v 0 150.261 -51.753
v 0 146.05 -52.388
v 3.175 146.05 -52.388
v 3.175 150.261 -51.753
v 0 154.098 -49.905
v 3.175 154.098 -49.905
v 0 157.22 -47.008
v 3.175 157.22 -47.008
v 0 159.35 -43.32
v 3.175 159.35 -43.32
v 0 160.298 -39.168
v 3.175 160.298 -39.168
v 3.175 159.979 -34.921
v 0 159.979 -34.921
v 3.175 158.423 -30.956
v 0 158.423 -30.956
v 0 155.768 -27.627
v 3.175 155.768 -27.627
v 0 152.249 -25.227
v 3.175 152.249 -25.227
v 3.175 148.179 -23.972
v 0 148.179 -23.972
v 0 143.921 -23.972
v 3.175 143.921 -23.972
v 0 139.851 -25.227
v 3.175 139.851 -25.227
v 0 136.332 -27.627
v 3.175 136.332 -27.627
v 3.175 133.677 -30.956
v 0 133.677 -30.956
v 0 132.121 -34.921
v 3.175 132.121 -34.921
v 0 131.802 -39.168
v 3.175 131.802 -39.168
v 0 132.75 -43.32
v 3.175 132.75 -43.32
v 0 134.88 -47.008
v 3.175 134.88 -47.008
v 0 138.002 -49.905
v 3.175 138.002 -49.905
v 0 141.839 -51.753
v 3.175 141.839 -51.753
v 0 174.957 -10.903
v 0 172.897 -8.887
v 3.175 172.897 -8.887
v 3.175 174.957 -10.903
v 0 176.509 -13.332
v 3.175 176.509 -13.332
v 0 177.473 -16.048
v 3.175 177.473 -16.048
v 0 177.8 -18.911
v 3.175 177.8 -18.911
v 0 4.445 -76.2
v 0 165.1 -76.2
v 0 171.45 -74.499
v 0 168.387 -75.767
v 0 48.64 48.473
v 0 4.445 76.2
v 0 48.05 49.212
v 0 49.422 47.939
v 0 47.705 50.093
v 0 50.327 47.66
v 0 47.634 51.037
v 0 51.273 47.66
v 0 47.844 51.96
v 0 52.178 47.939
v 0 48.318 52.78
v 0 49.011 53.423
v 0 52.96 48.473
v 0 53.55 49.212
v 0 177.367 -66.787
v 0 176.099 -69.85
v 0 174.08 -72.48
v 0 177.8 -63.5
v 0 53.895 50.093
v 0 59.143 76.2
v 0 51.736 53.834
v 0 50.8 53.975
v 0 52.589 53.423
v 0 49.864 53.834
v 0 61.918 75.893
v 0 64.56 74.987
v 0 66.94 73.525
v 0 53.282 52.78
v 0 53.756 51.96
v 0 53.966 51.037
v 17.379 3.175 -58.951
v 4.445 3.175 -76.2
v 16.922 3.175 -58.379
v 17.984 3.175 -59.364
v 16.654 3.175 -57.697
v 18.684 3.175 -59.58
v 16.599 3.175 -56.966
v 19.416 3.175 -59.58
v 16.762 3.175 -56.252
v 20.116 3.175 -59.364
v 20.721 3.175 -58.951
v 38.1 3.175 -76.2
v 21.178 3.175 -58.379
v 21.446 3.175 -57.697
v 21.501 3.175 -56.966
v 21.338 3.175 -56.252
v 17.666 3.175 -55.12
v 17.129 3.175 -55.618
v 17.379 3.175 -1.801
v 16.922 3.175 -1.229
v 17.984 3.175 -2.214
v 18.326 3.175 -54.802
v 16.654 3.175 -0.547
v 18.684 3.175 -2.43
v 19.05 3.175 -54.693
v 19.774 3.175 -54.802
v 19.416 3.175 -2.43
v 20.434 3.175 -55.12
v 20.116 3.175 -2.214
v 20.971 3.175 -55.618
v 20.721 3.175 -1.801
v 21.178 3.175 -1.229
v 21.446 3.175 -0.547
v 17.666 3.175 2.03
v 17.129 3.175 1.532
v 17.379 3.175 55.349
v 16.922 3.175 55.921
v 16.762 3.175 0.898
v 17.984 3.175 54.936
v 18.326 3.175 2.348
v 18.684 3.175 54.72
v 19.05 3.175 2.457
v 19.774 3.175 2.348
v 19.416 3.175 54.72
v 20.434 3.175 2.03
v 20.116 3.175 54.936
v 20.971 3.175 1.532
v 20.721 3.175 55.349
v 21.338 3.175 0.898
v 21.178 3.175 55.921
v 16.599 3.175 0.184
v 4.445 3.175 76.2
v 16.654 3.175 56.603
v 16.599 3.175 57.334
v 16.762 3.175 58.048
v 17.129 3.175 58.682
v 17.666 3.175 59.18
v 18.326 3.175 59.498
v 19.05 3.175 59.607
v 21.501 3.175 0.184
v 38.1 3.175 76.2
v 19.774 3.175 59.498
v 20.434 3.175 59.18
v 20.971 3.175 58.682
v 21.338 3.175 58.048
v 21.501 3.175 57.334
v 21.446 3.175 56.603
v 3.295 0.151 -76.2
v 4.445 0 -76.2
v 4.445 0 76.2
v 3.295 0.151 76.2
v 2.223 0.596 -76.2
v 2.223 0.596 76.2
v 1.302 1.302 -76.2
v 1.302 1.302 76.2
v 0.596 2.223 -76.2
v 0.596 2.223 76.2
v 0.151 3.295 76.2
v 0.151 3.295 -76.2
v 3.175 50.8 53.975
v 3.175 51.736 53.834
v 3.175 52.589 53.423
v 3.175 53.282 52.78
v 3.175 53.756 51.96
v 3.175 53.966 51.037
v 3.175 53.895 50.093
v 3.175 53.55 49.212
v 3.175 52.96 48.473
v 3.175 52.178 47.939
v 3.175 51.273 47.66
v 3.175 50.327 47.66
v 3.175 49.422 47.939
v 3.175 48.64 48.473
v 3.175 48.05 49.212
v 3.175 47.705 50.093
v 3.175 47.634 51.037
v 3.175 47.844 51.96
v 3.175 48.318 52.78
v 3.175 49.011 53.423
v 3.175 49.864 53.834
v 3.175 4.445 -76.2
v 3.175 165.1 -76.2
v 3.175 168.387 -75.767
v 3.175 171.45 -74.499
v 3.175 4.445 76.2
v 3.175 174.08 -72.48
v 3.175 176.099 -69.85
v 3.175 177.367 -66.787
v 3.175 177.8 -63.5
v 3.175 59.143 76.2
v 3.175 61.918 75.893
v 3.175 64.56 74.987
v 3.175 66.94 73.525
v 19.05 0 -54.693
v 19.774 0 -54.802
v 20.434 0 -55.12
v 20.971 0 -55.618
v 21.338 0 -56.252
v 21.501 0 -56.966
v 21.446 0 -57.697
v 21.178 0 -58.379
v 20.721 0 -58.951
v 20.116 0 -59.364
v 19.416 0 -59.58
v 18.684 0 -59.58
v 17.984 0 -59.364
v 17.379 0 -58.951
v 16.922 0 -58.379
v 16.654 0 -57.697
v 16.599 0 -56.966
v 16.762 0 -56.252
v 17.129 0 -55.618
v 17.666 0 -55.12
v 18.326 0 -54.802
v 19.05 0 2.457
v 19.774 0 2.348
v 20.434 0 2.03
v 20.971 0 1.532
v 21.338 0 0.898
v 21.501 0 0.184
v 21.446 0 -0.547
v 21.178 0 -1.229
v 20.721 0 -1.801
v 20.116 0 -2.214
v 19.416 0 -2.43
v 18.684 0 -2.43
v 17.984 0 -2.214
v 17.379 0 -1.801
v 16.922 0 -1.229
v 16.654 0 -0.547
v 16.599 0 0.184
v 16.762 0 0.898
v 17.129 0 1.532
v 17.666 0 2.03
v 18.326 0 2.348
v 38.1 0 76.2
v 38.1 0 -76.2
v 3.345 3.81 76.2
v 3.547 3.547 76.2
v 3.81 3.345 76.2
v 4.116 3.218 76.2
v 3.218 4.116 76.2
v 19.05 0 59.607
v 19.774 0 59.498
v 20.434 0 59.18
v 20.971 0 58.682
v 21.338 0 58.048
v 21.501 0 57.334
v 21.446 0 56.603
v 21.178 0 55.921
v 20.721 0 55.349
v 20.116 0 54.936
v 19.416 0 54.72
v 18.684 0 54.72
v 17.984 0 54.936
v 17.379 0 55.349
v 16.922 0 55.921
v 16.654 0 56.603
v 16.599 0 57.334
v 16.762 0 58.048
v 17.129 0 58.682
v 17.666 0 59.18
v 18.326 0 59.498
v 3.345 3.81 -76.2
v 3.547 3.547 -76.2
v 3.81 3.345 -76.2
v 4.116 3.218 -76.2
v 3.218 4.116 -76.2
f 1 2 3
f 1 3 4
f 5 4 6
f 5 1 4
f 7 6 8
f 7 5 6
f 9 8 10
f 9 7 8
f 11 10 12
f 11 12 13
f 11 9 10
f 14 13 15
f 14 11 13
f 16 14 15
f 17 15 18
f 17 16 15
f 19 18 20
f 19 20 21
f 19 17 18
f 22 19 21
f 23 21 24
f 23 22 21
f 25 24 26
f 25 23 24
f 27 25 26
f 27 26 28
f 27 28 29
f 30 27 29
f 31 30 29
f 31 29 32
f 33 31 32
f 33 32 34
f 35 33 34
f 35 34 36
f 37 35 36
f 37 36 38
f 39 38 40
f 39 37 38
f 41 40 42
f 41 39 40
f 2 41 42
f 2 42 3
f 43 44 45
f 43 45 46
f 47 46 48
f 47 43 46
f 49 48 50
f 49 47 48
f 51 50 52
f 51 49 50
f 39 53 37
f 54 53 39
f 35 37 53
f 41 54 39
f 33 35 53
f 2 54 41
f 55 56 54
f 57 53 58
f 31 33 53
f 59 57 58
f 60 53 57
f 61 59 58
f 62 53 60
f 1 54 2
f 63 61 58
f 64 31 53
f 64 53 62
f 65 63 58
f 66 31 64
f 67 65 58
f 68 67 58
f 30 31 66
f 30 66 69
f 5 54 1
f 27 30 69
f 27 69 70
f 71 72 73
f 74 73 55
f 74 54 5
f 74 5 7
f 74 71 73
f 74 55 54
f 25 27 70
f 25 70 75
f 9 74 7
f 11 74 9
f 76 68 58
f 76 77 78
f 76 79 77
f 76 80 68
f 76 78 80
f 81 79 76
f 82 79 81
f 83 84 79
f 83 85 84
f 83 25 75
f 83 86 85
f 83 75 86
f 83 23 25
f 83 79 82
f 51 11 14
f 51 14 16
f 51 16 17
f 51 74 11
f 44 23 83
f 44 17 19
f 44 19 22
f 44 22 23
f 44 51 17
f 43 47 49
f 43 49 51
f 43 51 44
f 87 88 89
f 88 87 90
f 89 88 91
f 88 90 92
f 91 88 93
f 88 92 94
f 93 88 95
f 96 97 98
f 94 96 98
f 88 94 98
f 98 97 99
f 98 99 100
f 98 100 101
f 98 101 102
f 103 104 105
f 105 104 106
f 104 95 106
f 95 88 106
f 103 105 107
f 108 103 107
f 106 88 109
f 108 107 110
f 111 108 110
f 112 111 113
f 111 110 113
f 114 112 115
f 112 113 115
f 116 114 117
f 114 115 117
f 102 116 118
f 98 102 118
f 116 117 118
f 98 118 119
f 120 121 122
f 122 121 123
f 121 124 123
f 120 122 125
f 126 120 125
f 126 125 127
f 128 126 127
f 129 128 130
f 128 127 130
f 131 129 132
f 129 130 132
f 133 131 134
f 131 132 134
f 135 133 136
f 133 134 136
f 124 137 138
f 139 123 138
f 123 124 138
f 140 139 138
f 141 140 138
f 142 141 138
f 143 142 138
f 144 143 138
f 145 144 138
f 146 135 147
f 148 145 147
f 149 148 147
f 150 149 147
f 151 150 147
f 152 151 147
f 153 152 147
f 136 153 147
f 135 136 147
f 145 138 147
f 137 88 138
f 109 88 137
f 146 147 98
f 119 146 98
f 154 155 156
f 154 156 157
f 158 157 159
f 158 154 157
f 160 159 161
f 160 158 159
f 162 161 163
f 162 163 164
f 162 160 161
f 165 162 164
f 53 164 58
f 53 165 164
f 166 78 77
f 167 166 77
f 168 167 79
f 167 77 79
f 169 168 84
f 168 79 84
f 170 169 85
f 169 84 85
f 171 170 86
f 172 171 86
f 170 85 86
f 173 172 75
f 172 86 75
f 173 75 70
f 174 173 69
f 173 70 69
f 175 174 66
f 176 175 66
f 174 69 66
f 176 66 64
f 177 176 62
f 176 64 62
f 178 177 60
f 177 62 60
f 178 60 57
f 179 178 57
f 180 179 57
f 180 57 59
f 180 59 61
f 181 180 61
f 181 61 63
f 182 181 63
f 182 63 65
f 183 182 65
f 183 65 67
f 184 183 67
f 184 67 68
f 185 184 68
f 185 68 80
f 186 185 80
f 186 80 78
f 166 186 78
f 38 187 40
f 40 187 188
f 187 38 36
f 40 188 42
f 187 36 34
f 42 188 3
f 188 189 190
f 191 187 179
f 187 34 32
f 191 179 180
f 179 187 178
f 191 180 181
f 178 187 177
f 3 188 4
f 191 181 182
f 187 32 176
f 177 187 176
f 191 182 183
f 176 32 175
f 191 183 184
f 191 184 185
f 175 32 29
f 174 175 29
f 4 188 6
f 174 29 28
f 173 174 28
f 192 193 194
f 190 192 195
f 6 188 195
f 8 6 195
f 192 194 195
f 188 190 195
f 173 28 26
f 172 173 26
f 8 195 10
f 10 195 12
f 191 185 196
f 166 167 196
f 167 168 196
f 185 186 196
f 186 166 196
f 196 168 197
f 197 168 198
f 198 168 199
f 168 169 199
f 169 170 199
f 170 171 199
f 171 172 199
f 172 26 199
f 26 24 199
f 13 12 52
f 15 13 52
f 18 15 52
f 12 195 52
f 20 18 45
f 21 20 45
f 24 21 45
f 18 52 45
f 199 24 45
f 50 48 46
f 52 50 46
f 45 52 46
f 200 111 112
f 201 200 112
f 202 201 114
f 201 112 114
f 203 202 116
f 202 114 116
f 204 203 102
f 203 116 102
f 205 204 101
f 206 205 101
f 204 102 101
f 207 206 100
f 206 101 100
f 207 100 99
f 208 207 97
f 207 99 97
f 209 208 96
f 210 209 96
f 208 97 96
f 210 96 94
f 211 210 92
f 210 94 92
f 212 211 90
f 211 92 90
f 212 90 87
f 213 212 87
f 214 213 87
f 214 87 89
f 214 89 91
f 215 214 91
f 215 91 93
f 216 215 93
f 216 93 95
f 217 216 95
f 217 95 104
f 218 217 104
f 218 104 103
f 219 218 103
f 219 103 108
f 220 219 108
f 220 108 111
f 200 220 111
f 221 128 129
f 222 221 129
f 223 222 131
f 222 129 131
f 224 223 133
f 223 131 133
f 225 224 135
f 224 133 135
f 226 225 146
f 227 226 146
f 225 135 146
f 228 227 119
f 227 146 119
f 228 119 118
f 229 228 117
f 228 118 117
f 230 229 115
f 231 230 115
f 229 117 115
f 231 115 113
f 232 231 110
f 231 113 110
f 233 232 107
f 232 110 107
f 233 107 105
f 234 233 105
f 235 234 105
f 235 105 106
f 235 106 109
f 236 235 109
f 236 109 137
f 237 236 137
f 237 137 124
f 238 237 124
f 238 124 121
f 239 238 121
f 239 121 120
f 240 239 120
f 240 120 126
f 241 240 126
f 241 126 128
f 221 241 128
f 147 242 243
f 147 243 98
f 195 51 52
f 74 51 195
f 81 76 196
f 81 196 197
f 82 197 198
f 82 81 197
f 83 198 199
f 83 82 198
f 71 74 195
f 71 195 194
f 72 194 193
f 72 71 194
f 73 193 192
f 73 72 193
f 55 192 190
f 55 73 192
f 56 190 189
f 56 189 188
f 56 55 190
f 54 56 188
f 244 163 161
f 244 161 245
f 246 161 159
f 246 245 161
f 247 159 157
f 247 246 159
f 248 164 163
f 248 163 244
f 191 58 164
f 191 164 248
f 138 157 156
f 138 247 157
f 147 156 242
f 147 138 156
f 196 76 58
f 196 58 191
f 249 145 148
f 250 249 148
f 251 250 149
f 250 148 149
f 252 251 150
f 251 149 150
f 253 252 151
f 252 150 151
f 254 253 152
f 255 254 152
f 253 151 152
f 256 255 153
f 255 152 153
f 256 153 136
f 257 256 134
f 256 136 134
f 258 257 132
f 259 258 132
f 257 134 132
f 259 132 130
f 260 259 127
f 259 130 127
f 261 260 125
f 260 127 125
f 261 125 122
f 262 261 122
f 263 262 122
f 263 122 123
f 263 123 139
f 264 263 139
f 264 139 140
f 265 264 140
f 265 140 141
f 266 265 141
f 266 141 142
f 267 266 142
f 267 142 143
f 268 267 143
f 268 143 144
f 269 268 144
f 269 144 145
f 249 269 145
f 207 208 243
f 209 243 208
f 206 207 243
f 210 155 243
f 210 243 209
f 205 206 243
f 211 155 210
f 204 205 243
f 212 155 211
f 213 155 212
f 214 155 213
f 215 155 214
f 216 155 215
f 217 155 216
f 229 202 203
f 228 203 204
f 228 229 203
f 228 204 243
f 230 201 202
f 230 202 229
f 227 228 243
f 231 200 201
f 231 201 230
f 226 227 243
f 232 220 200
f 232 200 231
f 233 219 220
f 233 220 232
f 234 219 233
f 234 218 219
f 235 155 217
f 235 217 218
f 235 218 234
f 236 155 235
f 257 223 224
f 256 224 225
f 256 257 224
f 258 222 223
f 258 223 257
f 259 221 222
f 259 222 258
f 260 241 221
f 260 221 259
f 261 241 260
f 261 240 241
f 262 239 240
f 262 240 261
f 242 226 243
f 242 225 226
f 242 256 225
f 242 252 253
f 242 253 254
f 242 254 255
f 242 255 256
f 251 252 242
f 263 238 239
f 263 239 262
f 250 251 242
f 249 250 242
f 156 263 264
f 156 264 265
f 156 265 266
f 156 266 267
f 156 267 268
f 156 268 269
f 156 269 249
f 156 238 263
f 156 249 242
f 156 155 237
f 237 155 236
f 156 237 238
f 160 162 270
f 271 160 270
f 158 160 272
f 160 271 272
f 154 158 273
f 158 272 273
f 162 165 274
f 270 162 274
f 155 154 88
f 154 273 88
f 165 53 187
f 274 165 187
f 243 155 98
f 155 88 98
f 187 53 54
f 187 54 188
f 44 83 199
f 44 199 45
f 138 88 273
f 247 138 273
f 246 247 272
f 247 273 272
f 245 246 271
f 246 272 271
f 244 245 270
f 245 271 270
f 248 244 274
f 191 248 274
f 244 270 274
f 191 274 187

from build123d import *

# Parameters (mm, degrees)
SKETCH1_R              = 14.2875
BOSS_EXTRUDE1_DEPTH    = 3.175
SKETCH2_W              = 38.1
SKETCH2_H              = 3.175
BOSS_EXTRUDE2_DEPTH    = 152.4
SKETCH3_R              = 2.45745
CUT_EXTRUDE1_DEPTH     = 195.298586266
CONVERT_SOLID1_START   = -76.2
CONVERT_SOLID1_DEPTH   = 152.4
CONVERT_SOLID1_2_DEPTH = 152.4
SKETCH4_R              = 3.175
CUT_EXTRUDE3_DEPTH     = 198.157018643


# Read off the part's stored shape, not the designer's step: Convert-Solid1
with BuildPart() as part:
    # Sketch1 → Boss-Extrude1 (new body)
    with BuildSketch(Plane(origin=(0, 0, 0), x_dir=(0, 0, -1), z_dir=(1, 0, 0))):
        with BuildLine():
            Line((-76.2, 0), (-76.2, 59.142531573))
            ThreePointArc((-76.2, 59.142531573), (-75.512589628, 63.264144174), (-73.524773161, 66.939577365))
            Line((-73.524773161, 66.939577365), (8.886591171, 172.897045792))
            ThreePointArc((8.886591171, 172.897045792), (13.331600966, 176.508603805), (18.911364332, 177.8))
            Line((18.911364332, 177.8), (63.5, 177.8))
            ThreePointArc((63.5, 177.8), (72.480256121, 174.080256121), (76.2, 165.1))
            Line((76.2, 165.1), (76.2, 0))
            Line((76.2, 0), (-76.2, 0))
        make_face()
        with Locations((38.1, 146.05)):
            Circle(SKETCH1_R, mode=Mode.SUBTRACT)
    extrude(amount=BOSS_EXTRUDE1_DEPTH)

    # Sketch2 → Boss-Extrude2 (add)
    with BuildSketch(Plane.XY.offset(76.2)):
        with Locations((19.05, 1.5875)):
            Rectangle(SKETCH2_W, SKETCH2_H)
    extrude(amount=-BOSS_EXTRUDE2_DEPTH)

    # Sketch3 → Cut-Extrude1 (cut, through all)
    with BuildSketch(Plane(origin=(0, 3.175, 0), x_dir=(1, 0, 0), z_dir=(0, 1, 0))):
        with Locations(Location((19.05, 57.15, 0), (0, 0, 270))):
            Circle(SKETCH3_R)
        with Locations(Location((19.05, 0, 0), (0, 0, 270))):
            Circle(SKETCH3_R)
        with Locations(Location((19.05, -57.15, 0), (0, 0, 270))):
            Circle(SKETCH3_R)
    extrude(amount=-CUT_EXTRUDE1_DEPTH, mode=Mode.SUBTRACT)

    # Convert-Solid1 outline → Convert-Solid1 (cut)
    with BuildSketch(Plane.XY.offset(CONVERT_SOLID1_START)):
        with BuildLine():
            Line((0, 0), (4.445, 0))
            ThreePointArc((4.445, 0), (1.301910358, 1.301910358), (0, 4.445))
            Line((0, 4.445), (0, 0))
        make_face()
    extrude(amount=CONVERT_SOLID1_DEPTH, mode=Mode.SUBTRACT)

    # Convert-Solid1 2 outline → Convert-Solid1 2 (add)
    with BuildSketch(Plane.XY.offset(CONVERT_SOLID1_START)):
        with BuildLine():
            Line((3.175, 3.175), (4.445, 3.175))
            ThreePointArc((4.445, 3.175), (3.546974388, 3.546974388), (3.175, 4.445))
            Line((3.175, 4.445), (3.175, 3.175))
        make_face()
    extrude(amount=CONVERT_SOLID1_2_DEPTH)

    # Sketch4 → Cut-Extrude3 (cut, through all)
    with BuildSketch(Plane.ZY):
        with Locations((50.8, 50.8)):
            Circle(SKETCH4_R)
    extrude(amount=-CUT_EXTRUDE3_DEPTH, mode=Mode.SUBTRACT)


solid = part.part
